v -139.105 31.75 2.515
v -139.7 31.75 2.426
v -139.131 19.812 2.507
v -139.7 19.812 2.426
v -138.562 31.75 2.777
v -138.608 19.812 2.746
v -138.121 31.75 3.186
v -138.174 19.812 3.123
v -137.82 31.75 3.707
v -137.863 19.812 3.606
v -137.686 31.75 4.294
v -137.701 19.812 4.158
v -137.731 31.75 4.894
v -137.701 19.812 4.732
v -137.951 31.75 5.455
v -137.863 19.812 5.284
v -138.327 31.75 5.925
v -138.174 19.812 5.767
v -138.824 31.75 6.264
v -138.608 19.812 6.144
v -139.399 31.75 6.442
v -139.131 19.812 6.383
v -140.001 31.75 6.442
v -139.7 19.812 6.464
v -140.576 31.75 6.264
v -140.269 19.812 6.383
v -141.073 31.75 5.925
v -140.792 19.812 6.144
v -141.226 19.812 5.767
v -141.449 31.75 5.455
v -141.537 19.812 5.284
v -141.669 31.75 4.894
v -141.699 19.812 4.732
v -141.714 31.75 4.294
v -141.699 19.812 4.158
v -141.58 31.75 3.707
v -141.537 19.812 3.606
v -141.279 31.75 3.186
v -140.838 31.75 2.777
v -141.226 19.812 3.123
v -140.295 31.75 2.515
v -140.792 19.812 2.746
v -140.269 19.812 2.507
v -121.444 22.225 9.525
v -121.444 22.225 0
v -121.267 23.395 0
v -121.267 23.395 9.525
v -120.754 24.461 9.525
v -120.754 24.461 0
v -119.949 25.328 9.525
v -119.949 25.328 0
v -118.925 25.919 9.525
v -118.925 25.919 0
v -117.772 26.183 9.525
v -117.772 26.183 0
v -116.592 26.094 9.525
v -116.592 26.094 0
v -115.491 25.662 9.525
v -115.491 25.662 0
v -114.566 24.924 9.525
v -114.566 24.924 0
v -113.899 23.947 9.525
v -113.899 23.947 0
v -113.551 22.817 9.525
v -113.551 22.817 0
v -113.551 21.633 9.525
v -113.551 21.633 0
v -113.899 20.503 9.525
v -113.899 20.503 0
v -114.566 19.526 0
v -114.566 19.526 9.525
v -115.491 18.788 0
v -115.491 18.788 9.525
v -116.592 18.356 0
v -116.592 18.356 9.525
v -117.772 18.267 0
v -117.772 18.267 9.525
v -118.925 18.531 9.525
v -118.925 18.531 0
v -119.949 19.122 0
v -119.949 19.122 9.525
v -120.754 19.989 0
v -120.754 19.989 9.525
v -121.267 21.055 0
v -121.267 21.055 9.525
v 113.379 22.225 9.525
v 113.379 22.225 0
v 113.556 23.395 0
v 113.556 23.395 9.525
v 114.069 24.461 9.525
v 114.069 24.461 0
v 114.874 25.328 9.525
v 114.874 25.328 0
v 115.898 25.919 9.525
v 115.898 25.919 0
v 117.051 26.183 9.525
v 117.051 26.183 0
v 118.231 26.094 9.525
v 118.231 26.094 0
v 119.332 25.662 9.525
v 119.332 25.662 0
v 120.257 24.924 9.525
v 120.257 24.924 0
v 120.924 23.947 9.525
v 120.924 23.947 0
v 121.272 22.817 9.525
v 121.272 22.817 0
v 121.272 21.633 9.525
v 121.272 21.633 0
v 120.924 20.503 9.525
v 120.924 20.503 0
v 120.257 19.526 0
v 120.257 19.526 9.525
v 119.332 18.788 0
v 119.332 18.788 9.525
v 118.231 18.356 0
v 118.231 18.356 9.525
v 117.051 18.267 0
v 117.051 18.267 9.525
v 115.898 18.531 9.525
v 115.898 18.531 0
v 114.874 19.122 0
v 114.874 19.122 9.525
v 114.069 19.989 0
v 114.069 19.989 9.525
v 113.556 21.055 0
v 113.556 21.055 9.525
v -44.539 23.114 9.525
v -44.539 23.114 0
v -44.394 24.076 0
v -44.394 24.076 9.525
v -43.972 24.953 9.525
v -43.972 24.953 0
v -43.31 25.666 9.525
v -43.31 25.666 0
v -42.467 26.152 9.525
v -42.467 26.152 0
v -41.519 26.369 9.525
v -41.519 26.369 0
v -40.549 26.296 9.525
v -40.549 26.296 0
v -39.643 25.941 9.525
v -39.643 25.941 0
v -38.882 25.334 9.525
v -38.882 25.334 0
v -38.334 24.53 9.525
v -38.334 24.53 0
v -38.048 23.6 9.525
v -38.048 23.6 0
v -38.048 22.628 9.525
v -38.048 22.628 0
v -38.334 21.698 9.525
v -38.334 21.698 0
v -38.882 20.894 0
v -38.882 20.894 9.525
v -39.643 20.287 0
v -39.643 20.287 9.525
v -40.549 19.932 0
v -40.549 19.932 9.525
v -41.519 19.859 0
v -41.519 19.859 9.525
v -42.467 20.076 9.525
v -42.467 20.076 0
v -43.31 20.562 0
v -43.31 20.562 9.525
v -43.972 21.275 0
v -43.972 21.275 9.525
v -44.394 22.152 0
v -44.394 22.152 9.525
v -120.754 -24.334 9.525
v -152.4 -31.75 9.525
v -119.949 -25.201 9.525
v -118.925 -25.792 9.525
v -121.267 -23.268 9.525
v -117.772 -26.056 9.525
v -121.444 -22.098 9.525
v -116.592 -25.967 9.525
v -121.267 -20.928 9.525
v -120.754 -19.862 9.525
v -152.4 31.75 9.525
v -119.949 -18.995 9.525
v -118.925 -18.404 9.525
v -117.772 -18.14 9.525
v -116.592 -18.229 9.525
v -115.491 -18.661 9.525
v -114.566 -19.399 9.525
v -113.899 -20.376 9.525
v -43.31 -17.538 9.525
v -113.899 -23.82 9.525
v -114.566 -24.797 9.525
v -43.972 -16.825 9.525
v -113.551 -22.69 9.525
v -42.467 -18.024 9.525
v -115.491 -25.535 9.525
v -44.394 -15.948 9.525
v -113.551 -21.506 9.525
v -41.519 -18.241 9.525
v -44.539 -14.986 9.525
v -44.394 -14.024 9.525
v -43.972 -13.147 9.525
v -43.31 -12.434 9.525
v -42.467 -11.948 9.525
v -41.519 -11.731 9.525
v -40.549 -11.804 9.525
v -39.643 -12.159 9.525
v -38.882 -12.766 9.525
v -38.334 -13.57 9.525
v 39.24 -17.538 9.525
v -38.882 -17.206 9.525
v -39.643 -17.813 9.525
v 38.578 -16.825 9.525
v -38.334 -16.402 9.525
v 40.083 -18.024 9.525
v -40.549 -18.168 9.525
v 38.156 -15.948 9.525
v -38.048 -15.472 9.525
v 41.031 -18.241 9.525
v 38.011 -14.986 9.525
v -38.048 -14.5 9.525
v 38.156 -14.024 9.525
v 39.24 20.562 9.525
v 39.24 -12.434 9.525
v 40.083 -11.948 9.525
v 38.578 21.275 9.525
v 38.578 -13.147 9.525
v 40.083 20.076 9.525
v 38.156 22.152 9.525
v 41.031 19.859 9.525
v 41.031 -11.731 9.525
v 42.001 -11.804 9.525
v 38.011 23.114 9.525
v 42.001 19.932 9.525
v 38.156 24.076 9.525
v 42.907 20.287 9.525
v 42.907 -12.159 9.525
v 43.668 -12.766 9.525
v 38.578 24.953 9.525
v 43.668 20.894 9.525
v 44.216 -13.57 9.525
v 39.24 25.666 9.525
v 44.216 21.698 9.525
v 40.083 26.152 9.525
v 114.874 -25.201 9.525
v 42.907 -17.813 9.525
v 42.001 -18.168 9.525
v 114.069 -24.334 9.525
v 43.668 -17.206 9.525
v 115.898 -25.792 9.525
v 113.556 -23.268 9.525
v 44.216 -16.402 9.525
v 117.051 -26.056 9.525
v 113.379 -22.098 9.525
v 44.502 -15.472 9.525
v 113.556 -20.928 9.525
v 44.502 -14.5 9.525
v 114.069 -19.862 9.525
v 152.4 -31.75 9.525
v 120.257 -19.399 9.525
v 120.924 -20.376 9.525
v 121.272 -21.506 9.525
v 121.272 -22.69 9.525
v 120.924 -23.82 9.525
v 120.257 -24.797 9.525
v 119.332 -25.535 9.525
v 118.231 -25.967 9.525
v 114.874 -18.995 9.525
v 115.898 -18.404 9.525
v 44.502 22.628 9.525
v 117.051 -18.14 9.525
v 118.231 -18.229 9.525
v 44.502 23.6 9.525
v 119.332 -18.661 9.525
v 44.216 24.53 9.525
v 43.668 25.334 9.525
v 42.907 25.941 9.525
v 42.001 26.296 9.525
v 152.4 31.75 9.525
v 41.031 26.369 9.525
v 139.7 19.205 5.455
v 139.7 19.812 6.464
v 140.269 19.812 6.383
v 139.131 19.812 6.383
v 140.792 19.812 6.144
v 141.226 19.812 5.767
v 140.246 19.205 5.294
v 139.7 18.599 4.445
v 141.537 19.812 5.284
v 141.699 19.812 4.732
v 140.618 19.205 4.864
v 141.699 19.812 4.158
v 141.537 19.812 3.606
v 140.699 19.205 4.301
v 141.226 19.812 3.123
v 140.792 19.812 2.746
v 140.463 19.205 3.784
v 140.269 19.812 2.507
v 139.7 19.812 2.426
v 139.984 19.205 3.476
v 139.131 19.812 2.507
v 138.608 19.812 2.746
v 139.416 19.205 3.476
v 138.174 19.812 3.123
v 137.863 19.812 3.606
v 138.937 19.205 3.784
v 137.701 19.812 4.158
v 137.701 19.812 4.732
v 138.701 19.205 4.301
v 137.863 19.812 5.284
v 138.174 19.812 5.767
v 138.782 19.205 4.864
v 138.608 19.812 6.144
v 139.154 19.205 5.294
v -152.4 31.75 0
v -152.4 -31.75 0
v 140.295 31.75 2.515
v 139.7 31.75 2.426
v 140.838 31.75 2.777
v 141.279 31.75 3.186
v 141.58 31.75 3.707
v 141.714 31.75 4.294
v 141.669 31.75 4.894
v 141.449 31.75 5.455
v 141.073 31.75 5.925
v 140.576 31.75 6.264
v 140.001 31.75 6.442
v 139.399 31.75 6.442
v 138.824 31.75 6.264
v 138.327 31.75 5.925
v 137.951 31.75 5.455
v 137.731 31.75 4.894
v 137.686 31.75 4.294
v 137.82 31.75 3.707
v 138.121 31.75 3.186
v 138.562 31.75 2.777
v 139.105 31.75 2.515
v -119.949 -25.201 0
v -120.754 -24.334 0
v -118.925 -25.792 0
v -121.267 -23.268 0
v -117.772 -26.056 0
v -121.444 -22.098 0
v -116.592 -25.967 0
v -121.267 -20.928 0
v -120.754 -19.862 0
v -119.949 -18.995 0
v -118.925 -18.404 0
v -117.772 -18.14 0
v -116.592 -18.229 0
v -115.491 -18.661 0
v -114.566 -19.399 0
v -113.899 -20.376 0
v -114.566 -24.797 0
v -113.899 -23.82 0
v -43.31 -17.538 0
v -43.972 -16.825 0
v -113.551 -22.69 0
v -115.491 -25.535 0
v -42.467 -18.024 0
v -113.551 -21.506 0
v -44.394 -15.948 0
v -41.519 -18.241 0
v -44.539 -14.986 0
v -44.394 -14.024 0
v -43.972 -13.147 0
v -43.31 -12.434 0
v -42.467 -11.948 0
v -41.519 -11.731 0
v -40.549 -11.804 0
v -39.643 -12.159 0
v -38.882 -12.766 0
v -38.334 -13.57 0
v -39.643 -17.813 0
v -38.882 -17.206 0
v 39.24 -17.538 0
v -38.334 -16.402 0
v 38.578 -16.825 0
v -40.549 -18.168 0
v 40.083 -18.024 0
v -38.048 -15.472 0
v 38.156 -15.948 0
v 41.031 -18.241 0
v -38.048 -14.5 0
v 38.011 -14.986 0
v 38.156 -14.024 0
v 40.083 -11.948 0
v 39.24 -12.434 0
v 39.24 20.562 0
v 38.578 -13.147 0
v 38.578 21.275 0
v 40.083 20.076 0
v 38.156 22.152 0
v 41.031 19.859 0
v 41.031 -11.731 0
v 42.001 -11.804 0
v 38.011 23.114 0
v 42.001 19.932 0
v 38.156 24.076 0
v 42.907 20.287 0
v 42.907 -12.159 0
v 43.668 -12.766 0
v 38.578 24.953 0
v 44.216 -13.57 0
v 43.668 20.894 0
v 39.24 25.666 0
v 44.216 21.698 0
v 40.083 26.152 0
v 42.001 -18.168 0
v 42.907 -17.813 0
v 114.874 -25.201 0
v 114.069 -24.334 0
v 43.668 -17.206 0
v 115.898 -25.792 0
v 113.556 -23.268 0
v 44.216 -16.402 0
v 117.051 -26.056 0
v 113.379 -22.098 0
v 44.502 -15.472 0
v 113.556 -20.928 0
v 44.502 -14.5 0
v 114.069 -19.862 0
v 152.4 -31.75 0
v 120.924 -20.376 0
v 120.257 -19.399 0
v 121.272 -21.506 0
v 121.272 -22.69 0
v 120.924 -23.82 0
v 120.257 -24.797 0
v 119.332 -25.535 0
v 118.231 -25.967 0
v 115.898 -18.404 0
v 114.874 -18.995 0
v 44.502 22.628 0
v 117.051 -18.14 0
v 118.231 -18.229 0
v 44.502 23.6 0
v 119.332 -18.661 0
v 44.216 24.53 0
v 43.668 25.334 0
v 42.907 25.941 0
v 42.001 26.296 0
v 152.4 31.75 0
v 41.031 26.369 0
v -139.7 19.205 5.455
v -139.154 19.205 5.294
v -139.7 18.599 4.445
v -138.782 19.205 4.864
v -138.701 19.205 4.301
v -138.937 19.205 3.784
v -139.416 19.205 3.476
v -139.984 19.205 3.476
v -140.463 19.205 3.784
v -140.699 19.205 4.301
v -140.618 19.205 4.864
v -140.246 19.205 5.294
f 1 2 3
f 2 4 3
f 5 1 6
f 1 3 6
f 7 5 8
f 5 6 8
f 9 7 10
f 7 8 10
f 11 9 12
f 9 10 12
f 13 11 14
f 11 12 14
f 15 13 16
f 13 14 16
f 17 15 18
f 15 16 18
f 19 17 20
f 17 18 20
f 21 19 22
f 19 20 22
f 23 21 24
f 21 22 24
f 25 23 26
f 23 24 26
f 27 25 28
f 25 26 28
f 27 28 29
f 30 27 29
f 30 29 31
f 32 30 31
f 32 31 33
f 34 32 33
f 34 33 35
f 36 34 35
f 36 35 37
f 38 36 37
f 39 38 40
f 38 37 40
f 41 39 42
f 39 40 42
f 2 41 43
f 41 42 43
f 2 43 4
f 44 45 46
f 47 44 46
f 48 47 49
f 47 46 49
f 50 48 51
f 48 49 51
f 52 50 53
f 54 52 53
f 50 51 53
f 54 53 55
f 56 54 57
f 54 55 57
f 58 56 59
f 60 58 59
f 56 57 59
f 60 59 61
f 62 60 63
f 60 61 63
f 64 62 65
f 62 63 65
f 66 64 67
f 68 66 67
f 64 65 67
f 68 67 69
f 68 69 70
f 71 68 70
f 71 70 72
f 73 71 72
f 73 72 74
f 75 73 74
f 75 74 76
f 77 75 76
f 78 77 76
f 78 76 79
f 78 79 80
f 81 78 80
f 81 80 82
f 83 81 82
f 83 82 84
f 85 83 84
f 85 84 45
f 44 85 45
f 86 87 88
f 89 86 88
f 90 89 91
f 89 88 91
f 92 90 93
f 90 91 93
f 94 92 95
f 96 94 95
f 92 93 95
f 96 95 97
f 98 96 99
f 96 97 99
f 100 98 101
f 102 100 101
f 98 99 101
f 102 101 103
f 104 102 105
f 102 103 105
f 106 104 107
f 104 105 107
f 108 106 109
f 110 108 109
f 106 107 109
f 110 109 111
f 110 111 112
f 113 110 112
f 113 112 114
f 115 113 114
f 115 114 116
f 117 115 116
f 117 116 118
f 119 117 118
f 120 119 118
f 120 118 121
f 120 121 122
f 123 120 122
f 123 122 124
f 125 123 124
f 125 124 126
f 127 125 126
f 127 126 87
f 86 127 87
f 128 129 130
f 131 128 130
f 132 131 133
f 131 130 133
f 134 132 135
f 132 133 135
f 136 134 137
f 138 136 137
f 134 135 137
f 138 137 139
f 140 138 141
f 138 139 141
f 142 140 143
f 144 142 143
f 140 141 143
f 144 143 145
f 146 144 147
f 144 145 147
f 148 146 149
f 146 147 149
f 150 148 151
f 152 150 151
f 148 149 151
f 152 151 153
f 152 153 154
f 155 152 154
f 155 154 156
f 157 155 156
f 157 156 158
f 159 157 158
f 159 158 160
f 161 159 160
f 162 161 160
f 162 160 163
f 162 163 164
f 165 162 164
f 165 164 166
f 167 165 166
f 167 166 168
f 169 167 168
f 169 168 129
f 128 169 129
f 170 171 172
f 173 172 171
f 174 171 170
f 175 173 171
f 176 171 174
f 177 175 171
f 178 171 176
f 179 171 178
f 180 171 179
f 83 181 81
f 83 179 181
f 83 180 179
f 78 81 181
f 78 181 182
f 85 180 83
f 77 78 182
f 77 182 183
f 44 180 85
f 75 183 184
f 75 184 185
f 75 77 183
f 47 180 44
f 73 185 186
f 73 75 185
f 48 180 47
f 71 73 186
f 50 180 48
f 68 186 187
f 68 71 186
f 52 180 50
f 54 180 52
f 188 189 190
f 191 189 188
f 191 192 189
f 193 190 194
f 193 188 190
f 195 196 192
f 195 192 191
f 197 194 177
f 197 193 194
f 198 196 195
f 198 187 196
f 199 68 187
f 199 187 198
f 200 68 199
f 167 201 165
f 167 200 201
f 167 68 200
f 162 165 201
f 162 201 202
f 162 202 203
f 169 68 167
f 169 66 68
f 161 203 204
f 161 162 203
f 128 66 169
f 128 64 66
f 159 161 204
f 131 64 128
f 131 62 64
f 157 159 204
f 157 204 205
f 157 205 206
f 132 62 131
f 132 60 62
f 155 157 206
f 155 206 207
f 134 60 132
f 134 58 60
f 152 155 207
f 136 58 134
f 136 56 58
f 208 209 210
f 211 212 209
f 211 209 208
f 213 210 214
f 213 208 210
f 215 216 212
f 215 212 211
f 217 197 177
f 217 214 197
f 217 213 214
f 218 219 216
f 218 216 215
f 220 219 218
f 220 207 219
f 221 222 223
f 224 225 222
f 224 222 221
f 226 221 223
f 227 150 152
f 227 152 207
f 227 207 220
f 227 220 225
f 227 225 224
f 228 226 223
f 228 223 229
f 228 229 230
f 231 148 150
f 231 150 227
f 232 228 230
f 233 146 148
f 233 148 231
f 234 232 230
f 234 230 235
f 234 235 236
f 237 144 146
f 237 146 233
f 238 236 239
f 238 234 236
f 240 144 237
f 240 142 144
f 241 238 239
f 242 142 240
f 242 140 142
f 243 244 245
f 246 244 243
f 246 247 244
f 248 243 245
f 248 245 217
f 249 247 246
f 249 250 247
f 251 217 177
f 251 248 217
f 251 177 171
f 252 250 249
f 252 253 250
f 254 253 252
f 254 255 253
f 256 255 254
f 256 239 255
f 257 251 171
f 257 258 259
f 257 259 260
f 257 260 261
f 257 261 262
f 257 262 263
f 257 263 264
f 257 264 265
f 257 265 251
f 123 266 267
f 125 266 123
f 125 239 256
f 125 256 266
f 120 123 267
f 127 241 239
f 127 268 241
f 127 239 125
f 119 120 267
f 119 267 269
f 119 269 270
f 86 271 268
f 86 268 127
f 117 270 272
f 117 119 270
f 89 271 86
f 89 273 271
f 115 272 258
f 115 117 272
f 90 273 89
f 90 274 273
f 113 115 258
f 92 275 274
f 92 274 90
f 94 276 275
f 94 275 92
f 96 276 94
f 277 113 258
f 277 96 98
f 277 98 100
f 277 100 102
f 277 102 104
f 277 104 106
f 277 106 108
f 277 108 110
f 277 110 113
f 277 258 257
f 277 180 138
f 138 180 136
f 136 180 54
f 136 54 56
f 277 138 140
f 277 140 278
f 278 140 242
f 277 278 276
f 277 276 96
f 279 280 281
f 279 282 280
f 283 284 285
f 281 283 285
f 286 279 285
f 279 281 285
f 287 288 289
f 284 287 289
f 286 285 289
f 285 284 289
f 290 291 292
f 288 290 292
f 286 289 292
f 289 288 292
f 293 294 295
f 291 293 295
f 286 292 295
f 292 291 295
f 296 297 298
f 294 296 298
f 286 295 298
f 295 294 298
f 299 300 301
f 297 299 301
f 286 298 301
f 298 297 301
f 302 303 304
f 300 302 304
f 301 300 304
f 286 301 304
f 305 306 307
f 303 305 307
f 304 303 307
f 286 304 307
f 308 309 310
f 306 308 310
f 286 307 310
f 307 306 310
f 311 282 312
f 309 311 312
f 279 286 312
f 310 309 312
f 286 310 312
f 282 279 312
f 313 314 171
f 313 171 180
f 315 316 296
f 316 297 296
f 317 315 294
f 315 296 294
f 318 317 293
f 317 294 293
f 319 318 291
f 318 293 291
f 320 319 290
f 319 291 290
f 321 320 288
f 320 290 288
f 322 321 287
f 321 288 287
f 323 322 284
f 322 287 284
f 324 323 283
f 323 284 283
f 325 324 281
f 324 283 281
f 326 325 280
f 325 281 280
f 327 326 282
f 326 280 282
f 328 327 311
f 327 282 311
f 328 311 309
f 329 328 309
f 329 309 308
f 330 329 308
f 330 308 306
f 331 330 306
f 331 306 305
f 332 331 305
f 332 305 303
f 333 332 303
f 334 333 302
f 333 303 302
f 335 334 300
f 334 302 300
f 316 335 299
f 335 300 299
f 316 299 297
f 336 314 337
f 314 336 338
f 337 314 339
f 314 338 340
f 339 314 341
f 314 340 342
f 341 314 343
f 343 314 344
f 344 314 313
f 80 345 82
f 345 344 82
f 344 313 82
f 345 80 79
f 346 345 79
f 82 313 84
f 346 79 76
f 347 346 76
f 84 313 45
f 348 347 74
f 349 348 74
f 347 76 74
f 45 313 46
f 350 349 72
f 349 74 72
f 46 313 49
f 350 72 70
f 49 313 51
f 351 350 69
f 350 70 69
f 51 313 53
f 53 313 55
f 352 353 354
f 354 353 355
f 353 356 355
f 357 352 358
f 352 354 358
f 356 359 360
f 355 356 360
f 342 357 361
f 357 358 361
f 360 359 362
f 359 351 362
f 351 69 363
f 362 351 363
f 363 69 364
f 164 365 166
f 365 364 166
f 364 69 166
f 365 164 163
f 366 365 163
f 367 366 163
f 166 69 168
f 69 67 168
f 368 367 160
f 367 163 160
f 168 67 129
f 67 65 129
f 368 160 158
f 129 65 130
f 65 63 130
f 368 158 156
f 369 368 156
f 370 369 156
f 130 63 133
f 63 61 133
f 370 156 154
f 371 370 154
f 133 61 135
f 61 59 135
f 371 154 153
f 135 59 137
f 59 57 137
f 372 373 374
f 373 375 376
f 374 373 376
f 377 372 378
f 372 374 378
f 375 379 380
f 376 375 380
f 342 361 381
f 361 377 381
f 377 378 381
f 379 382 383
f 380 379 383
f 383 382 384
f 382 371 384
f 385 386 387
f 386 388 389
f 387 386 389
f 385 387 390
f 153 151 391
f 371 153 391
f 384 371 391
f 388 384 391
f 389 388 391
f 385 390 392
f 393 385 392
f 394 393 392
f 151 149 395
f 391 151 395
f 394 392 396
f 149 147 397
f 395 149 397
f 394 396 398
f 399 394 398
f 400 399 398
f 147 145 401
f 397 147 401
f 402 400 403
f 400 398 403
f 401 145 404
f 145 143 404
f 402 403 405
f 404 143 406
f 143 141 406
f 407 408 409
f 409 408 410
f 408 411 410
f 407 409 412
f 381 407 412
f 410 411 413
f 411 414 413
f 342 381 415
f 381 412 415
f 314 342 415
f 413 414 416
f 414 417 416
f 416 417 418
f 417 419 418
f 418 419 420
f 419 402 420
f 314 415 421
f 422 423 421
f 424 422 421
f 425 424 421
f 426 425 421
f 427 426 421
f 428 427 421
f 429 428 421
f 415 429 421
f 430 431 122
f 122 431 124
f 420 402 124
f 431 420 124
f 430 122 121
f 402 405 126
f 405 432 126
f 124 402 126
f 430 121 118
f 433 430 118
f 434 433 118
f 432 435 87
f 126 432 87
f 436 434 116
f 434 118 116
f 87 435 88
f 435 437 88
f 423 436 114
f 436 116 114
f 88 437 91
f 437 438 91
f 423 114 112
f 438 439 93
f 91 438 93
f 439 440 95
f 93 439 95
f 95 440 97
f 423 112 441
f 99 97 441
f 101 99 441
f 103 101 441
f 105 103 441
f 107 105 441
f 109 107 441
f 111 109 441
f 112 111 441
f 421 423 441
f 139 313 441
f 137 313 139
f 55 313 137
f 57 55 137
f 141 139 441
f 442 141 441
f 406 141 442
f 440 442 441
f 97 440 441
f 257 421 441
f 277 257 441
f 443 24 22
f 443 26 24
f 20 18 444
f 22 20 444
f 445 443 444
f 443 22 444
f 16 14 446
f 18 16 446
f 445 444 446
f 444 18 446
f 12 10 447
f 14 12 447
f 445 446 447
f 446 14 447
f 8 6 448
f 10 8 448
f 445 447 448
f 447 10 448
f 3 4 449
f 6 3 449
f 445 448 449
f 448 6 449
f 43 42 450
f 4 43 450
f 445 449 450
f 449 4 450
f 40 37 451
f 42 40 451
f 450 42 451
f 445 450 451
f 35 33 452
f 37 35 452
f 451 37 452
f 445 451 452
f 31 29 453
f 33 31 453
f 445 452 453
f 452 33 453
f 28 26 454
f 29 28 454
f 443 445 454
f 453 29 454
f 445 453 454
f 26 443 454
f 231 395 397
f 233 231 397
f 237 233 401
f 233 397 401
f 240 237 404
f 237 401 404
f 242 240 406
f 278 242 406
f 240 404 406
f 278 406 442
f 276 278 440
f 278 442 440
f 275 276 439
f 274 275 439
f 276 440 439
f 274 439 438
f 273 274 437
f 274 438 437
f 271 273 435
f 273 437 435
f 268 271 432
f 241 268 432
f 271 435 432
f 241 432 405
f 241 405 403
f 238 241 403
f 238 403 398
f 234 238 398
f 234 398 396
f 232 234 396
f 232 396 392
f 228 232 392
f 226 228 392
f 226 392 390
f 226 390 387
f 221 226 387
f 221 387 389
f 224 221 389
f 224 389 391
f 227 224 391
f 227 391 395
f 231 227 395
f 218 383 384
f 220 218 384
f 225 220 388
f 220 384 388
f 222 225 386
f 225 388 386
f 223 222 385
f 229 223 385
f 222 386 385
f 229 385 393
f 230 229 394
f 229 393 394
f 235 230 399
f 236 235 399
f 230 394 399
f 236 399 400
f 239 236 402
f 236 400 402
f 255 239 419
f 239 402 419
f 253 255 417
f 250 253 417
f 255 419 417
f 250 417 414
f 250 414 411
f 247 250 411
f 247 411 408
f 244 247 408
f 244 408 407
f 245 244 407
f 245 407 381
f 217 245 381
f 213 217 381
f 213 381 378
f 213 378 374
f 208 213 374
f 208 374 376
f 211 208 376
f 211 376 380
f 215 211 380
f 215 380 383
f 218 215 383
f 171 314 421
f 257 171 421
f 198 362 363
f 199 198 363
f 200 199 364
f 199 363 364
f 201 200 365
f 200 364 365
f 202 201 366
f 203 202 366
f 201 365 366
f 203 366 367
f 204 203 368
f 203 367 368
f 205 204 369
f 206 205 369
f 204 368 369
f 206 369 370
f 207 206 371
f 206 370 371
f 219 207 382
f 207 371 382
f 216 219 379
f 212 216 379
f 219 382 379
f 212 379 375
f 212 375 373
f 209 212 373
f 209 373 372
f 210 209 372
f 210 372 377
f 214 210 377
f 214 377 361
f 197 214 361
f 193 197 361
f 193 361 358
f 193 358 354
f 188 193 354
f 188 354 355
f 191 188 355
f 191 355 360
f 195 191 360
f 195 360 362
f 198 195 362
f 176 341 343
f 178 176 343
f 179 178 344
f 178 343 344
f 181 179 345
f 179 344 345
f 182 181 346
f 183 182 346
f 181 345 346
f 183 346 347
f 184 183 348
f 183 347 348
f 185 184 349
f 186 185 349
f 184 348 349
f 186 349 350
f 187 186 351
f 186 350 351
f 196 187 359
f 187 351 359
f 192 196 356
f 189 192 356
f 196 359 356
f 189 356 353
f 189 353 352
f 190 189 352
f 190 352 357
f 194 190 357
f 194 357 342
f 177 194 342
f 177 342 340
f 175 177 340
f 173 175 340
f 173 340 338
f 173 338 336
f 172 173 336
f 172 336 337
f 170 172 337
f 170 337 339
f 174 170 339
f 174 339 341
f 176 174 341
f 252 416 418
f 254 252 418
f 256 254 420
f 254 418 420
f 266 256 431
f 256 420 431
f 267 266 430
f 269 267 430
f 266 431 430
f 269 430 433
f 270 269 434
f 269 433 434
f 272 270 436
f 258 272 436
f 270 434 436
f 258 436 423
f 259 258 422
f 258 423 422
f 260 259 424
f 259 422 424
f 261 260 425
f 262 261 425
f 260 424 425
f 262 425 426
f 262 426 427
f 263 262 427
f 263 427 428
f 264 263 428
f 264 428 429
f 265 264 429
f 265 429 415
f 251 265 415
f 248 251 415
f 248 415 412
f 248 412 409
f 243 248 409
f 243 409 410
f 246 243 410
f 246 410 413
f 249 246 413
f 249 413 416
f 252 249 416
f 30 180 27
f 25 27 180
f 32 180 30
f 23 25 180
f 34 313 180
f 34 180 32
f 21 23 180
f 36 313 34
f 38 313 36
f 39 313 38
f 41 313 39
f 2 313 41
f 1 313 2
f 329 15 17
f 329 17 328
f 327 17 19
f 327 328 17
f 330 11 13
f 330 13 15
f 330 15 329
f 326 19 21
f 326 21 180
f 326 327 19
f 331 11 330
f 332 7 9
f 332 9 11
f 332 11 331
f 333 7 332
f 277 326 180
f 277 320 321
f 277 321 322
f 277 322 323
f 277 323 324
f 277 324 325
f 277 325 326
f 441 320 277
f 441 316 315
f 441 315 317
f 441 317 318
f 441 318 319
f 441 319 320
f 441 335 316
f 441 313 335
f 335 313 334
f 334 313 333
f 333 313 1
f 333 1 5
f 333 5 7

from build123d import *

# Parameters (mm, degrees)
SKETCH1_W                      = 304.8
SKETCH1_H                      = 63.5
BOSS_EXTRUDE1_DEPTH            = 9.525
F_5_16_18_TAPPED_HOLE1_D       = 6.5278
F_5_16_0_3125_DIAMETER_HOLE1_D = 7.9375
F_10_32_TAPPED_HOLE1_D         = 4.0386
F_10_32_TAPPED_HOLE1_DEPTH     = 11.938
F_10_32_TAPPED_HOLE1_TIP       = 1.213317848


with BuildPart() as part:
    # Sketch1 → Boss-Extrude1 (new body)
    with BuildSketch(Plane.XY):
        Rectangle(SKETCH1_W, SKETCH1_H)
    extrude(amount=BOSS_EXTRUDE1_DEPTH)

    # 5/16-18 Tapped Hole1 (through all)
    with Locations(Plane(origin=(-41.275, 23.114, 9.525), x_dir=(1, 0, 0), z_dir=(0, 0, 1))):
        with Locations((0, 0), (82.55, 0), (82.55, -38.1), (0, -38.1)):
            Hole(F_5_16_18_TAPPED_HOLE1_D / 2)

    # 5/16 (0.3125) Diameter Hole1 (through all)
    with Locations(Plane(origin=(-117.475, 22.225, 9.525), x_dir=(1, 0, 0), z_dir=(0, 0, 1))):
        with Locations((0, 0), (0, -44.323), (234.823, -44.323), (234.823, 0)):
            Hole(F_5_16_0_3125_DIAMETER_HOLE1_D / 2)

    # #10-32 Tapped Hole1
    with Locations(Plane(origin=(-139.7, 31.75, 4.445), x_dir=(0, 0, 1), z_dir=(0, 1, 0))):
        with Locations((0, 0), (0, 279.4)):
            Hole(F_10_32_TAPPED_HOLE1_D / 2, depth=F_10_32_TAPPED_HOLE1_DEPTH)
            with Locations((0, 0, -(F_10_32_TAPPED_HOLE1_DEPTH + F_10_32_TAPPED_HOLE1_TIP / 2))):  # 118° drill point
                Cone(0, F_10_32_TAPPED_HOLE1_D / 2, F_10_32_TAPPED_HOLE1_TIP, mode=Mode.SUBTRACT)


solid = part.part
